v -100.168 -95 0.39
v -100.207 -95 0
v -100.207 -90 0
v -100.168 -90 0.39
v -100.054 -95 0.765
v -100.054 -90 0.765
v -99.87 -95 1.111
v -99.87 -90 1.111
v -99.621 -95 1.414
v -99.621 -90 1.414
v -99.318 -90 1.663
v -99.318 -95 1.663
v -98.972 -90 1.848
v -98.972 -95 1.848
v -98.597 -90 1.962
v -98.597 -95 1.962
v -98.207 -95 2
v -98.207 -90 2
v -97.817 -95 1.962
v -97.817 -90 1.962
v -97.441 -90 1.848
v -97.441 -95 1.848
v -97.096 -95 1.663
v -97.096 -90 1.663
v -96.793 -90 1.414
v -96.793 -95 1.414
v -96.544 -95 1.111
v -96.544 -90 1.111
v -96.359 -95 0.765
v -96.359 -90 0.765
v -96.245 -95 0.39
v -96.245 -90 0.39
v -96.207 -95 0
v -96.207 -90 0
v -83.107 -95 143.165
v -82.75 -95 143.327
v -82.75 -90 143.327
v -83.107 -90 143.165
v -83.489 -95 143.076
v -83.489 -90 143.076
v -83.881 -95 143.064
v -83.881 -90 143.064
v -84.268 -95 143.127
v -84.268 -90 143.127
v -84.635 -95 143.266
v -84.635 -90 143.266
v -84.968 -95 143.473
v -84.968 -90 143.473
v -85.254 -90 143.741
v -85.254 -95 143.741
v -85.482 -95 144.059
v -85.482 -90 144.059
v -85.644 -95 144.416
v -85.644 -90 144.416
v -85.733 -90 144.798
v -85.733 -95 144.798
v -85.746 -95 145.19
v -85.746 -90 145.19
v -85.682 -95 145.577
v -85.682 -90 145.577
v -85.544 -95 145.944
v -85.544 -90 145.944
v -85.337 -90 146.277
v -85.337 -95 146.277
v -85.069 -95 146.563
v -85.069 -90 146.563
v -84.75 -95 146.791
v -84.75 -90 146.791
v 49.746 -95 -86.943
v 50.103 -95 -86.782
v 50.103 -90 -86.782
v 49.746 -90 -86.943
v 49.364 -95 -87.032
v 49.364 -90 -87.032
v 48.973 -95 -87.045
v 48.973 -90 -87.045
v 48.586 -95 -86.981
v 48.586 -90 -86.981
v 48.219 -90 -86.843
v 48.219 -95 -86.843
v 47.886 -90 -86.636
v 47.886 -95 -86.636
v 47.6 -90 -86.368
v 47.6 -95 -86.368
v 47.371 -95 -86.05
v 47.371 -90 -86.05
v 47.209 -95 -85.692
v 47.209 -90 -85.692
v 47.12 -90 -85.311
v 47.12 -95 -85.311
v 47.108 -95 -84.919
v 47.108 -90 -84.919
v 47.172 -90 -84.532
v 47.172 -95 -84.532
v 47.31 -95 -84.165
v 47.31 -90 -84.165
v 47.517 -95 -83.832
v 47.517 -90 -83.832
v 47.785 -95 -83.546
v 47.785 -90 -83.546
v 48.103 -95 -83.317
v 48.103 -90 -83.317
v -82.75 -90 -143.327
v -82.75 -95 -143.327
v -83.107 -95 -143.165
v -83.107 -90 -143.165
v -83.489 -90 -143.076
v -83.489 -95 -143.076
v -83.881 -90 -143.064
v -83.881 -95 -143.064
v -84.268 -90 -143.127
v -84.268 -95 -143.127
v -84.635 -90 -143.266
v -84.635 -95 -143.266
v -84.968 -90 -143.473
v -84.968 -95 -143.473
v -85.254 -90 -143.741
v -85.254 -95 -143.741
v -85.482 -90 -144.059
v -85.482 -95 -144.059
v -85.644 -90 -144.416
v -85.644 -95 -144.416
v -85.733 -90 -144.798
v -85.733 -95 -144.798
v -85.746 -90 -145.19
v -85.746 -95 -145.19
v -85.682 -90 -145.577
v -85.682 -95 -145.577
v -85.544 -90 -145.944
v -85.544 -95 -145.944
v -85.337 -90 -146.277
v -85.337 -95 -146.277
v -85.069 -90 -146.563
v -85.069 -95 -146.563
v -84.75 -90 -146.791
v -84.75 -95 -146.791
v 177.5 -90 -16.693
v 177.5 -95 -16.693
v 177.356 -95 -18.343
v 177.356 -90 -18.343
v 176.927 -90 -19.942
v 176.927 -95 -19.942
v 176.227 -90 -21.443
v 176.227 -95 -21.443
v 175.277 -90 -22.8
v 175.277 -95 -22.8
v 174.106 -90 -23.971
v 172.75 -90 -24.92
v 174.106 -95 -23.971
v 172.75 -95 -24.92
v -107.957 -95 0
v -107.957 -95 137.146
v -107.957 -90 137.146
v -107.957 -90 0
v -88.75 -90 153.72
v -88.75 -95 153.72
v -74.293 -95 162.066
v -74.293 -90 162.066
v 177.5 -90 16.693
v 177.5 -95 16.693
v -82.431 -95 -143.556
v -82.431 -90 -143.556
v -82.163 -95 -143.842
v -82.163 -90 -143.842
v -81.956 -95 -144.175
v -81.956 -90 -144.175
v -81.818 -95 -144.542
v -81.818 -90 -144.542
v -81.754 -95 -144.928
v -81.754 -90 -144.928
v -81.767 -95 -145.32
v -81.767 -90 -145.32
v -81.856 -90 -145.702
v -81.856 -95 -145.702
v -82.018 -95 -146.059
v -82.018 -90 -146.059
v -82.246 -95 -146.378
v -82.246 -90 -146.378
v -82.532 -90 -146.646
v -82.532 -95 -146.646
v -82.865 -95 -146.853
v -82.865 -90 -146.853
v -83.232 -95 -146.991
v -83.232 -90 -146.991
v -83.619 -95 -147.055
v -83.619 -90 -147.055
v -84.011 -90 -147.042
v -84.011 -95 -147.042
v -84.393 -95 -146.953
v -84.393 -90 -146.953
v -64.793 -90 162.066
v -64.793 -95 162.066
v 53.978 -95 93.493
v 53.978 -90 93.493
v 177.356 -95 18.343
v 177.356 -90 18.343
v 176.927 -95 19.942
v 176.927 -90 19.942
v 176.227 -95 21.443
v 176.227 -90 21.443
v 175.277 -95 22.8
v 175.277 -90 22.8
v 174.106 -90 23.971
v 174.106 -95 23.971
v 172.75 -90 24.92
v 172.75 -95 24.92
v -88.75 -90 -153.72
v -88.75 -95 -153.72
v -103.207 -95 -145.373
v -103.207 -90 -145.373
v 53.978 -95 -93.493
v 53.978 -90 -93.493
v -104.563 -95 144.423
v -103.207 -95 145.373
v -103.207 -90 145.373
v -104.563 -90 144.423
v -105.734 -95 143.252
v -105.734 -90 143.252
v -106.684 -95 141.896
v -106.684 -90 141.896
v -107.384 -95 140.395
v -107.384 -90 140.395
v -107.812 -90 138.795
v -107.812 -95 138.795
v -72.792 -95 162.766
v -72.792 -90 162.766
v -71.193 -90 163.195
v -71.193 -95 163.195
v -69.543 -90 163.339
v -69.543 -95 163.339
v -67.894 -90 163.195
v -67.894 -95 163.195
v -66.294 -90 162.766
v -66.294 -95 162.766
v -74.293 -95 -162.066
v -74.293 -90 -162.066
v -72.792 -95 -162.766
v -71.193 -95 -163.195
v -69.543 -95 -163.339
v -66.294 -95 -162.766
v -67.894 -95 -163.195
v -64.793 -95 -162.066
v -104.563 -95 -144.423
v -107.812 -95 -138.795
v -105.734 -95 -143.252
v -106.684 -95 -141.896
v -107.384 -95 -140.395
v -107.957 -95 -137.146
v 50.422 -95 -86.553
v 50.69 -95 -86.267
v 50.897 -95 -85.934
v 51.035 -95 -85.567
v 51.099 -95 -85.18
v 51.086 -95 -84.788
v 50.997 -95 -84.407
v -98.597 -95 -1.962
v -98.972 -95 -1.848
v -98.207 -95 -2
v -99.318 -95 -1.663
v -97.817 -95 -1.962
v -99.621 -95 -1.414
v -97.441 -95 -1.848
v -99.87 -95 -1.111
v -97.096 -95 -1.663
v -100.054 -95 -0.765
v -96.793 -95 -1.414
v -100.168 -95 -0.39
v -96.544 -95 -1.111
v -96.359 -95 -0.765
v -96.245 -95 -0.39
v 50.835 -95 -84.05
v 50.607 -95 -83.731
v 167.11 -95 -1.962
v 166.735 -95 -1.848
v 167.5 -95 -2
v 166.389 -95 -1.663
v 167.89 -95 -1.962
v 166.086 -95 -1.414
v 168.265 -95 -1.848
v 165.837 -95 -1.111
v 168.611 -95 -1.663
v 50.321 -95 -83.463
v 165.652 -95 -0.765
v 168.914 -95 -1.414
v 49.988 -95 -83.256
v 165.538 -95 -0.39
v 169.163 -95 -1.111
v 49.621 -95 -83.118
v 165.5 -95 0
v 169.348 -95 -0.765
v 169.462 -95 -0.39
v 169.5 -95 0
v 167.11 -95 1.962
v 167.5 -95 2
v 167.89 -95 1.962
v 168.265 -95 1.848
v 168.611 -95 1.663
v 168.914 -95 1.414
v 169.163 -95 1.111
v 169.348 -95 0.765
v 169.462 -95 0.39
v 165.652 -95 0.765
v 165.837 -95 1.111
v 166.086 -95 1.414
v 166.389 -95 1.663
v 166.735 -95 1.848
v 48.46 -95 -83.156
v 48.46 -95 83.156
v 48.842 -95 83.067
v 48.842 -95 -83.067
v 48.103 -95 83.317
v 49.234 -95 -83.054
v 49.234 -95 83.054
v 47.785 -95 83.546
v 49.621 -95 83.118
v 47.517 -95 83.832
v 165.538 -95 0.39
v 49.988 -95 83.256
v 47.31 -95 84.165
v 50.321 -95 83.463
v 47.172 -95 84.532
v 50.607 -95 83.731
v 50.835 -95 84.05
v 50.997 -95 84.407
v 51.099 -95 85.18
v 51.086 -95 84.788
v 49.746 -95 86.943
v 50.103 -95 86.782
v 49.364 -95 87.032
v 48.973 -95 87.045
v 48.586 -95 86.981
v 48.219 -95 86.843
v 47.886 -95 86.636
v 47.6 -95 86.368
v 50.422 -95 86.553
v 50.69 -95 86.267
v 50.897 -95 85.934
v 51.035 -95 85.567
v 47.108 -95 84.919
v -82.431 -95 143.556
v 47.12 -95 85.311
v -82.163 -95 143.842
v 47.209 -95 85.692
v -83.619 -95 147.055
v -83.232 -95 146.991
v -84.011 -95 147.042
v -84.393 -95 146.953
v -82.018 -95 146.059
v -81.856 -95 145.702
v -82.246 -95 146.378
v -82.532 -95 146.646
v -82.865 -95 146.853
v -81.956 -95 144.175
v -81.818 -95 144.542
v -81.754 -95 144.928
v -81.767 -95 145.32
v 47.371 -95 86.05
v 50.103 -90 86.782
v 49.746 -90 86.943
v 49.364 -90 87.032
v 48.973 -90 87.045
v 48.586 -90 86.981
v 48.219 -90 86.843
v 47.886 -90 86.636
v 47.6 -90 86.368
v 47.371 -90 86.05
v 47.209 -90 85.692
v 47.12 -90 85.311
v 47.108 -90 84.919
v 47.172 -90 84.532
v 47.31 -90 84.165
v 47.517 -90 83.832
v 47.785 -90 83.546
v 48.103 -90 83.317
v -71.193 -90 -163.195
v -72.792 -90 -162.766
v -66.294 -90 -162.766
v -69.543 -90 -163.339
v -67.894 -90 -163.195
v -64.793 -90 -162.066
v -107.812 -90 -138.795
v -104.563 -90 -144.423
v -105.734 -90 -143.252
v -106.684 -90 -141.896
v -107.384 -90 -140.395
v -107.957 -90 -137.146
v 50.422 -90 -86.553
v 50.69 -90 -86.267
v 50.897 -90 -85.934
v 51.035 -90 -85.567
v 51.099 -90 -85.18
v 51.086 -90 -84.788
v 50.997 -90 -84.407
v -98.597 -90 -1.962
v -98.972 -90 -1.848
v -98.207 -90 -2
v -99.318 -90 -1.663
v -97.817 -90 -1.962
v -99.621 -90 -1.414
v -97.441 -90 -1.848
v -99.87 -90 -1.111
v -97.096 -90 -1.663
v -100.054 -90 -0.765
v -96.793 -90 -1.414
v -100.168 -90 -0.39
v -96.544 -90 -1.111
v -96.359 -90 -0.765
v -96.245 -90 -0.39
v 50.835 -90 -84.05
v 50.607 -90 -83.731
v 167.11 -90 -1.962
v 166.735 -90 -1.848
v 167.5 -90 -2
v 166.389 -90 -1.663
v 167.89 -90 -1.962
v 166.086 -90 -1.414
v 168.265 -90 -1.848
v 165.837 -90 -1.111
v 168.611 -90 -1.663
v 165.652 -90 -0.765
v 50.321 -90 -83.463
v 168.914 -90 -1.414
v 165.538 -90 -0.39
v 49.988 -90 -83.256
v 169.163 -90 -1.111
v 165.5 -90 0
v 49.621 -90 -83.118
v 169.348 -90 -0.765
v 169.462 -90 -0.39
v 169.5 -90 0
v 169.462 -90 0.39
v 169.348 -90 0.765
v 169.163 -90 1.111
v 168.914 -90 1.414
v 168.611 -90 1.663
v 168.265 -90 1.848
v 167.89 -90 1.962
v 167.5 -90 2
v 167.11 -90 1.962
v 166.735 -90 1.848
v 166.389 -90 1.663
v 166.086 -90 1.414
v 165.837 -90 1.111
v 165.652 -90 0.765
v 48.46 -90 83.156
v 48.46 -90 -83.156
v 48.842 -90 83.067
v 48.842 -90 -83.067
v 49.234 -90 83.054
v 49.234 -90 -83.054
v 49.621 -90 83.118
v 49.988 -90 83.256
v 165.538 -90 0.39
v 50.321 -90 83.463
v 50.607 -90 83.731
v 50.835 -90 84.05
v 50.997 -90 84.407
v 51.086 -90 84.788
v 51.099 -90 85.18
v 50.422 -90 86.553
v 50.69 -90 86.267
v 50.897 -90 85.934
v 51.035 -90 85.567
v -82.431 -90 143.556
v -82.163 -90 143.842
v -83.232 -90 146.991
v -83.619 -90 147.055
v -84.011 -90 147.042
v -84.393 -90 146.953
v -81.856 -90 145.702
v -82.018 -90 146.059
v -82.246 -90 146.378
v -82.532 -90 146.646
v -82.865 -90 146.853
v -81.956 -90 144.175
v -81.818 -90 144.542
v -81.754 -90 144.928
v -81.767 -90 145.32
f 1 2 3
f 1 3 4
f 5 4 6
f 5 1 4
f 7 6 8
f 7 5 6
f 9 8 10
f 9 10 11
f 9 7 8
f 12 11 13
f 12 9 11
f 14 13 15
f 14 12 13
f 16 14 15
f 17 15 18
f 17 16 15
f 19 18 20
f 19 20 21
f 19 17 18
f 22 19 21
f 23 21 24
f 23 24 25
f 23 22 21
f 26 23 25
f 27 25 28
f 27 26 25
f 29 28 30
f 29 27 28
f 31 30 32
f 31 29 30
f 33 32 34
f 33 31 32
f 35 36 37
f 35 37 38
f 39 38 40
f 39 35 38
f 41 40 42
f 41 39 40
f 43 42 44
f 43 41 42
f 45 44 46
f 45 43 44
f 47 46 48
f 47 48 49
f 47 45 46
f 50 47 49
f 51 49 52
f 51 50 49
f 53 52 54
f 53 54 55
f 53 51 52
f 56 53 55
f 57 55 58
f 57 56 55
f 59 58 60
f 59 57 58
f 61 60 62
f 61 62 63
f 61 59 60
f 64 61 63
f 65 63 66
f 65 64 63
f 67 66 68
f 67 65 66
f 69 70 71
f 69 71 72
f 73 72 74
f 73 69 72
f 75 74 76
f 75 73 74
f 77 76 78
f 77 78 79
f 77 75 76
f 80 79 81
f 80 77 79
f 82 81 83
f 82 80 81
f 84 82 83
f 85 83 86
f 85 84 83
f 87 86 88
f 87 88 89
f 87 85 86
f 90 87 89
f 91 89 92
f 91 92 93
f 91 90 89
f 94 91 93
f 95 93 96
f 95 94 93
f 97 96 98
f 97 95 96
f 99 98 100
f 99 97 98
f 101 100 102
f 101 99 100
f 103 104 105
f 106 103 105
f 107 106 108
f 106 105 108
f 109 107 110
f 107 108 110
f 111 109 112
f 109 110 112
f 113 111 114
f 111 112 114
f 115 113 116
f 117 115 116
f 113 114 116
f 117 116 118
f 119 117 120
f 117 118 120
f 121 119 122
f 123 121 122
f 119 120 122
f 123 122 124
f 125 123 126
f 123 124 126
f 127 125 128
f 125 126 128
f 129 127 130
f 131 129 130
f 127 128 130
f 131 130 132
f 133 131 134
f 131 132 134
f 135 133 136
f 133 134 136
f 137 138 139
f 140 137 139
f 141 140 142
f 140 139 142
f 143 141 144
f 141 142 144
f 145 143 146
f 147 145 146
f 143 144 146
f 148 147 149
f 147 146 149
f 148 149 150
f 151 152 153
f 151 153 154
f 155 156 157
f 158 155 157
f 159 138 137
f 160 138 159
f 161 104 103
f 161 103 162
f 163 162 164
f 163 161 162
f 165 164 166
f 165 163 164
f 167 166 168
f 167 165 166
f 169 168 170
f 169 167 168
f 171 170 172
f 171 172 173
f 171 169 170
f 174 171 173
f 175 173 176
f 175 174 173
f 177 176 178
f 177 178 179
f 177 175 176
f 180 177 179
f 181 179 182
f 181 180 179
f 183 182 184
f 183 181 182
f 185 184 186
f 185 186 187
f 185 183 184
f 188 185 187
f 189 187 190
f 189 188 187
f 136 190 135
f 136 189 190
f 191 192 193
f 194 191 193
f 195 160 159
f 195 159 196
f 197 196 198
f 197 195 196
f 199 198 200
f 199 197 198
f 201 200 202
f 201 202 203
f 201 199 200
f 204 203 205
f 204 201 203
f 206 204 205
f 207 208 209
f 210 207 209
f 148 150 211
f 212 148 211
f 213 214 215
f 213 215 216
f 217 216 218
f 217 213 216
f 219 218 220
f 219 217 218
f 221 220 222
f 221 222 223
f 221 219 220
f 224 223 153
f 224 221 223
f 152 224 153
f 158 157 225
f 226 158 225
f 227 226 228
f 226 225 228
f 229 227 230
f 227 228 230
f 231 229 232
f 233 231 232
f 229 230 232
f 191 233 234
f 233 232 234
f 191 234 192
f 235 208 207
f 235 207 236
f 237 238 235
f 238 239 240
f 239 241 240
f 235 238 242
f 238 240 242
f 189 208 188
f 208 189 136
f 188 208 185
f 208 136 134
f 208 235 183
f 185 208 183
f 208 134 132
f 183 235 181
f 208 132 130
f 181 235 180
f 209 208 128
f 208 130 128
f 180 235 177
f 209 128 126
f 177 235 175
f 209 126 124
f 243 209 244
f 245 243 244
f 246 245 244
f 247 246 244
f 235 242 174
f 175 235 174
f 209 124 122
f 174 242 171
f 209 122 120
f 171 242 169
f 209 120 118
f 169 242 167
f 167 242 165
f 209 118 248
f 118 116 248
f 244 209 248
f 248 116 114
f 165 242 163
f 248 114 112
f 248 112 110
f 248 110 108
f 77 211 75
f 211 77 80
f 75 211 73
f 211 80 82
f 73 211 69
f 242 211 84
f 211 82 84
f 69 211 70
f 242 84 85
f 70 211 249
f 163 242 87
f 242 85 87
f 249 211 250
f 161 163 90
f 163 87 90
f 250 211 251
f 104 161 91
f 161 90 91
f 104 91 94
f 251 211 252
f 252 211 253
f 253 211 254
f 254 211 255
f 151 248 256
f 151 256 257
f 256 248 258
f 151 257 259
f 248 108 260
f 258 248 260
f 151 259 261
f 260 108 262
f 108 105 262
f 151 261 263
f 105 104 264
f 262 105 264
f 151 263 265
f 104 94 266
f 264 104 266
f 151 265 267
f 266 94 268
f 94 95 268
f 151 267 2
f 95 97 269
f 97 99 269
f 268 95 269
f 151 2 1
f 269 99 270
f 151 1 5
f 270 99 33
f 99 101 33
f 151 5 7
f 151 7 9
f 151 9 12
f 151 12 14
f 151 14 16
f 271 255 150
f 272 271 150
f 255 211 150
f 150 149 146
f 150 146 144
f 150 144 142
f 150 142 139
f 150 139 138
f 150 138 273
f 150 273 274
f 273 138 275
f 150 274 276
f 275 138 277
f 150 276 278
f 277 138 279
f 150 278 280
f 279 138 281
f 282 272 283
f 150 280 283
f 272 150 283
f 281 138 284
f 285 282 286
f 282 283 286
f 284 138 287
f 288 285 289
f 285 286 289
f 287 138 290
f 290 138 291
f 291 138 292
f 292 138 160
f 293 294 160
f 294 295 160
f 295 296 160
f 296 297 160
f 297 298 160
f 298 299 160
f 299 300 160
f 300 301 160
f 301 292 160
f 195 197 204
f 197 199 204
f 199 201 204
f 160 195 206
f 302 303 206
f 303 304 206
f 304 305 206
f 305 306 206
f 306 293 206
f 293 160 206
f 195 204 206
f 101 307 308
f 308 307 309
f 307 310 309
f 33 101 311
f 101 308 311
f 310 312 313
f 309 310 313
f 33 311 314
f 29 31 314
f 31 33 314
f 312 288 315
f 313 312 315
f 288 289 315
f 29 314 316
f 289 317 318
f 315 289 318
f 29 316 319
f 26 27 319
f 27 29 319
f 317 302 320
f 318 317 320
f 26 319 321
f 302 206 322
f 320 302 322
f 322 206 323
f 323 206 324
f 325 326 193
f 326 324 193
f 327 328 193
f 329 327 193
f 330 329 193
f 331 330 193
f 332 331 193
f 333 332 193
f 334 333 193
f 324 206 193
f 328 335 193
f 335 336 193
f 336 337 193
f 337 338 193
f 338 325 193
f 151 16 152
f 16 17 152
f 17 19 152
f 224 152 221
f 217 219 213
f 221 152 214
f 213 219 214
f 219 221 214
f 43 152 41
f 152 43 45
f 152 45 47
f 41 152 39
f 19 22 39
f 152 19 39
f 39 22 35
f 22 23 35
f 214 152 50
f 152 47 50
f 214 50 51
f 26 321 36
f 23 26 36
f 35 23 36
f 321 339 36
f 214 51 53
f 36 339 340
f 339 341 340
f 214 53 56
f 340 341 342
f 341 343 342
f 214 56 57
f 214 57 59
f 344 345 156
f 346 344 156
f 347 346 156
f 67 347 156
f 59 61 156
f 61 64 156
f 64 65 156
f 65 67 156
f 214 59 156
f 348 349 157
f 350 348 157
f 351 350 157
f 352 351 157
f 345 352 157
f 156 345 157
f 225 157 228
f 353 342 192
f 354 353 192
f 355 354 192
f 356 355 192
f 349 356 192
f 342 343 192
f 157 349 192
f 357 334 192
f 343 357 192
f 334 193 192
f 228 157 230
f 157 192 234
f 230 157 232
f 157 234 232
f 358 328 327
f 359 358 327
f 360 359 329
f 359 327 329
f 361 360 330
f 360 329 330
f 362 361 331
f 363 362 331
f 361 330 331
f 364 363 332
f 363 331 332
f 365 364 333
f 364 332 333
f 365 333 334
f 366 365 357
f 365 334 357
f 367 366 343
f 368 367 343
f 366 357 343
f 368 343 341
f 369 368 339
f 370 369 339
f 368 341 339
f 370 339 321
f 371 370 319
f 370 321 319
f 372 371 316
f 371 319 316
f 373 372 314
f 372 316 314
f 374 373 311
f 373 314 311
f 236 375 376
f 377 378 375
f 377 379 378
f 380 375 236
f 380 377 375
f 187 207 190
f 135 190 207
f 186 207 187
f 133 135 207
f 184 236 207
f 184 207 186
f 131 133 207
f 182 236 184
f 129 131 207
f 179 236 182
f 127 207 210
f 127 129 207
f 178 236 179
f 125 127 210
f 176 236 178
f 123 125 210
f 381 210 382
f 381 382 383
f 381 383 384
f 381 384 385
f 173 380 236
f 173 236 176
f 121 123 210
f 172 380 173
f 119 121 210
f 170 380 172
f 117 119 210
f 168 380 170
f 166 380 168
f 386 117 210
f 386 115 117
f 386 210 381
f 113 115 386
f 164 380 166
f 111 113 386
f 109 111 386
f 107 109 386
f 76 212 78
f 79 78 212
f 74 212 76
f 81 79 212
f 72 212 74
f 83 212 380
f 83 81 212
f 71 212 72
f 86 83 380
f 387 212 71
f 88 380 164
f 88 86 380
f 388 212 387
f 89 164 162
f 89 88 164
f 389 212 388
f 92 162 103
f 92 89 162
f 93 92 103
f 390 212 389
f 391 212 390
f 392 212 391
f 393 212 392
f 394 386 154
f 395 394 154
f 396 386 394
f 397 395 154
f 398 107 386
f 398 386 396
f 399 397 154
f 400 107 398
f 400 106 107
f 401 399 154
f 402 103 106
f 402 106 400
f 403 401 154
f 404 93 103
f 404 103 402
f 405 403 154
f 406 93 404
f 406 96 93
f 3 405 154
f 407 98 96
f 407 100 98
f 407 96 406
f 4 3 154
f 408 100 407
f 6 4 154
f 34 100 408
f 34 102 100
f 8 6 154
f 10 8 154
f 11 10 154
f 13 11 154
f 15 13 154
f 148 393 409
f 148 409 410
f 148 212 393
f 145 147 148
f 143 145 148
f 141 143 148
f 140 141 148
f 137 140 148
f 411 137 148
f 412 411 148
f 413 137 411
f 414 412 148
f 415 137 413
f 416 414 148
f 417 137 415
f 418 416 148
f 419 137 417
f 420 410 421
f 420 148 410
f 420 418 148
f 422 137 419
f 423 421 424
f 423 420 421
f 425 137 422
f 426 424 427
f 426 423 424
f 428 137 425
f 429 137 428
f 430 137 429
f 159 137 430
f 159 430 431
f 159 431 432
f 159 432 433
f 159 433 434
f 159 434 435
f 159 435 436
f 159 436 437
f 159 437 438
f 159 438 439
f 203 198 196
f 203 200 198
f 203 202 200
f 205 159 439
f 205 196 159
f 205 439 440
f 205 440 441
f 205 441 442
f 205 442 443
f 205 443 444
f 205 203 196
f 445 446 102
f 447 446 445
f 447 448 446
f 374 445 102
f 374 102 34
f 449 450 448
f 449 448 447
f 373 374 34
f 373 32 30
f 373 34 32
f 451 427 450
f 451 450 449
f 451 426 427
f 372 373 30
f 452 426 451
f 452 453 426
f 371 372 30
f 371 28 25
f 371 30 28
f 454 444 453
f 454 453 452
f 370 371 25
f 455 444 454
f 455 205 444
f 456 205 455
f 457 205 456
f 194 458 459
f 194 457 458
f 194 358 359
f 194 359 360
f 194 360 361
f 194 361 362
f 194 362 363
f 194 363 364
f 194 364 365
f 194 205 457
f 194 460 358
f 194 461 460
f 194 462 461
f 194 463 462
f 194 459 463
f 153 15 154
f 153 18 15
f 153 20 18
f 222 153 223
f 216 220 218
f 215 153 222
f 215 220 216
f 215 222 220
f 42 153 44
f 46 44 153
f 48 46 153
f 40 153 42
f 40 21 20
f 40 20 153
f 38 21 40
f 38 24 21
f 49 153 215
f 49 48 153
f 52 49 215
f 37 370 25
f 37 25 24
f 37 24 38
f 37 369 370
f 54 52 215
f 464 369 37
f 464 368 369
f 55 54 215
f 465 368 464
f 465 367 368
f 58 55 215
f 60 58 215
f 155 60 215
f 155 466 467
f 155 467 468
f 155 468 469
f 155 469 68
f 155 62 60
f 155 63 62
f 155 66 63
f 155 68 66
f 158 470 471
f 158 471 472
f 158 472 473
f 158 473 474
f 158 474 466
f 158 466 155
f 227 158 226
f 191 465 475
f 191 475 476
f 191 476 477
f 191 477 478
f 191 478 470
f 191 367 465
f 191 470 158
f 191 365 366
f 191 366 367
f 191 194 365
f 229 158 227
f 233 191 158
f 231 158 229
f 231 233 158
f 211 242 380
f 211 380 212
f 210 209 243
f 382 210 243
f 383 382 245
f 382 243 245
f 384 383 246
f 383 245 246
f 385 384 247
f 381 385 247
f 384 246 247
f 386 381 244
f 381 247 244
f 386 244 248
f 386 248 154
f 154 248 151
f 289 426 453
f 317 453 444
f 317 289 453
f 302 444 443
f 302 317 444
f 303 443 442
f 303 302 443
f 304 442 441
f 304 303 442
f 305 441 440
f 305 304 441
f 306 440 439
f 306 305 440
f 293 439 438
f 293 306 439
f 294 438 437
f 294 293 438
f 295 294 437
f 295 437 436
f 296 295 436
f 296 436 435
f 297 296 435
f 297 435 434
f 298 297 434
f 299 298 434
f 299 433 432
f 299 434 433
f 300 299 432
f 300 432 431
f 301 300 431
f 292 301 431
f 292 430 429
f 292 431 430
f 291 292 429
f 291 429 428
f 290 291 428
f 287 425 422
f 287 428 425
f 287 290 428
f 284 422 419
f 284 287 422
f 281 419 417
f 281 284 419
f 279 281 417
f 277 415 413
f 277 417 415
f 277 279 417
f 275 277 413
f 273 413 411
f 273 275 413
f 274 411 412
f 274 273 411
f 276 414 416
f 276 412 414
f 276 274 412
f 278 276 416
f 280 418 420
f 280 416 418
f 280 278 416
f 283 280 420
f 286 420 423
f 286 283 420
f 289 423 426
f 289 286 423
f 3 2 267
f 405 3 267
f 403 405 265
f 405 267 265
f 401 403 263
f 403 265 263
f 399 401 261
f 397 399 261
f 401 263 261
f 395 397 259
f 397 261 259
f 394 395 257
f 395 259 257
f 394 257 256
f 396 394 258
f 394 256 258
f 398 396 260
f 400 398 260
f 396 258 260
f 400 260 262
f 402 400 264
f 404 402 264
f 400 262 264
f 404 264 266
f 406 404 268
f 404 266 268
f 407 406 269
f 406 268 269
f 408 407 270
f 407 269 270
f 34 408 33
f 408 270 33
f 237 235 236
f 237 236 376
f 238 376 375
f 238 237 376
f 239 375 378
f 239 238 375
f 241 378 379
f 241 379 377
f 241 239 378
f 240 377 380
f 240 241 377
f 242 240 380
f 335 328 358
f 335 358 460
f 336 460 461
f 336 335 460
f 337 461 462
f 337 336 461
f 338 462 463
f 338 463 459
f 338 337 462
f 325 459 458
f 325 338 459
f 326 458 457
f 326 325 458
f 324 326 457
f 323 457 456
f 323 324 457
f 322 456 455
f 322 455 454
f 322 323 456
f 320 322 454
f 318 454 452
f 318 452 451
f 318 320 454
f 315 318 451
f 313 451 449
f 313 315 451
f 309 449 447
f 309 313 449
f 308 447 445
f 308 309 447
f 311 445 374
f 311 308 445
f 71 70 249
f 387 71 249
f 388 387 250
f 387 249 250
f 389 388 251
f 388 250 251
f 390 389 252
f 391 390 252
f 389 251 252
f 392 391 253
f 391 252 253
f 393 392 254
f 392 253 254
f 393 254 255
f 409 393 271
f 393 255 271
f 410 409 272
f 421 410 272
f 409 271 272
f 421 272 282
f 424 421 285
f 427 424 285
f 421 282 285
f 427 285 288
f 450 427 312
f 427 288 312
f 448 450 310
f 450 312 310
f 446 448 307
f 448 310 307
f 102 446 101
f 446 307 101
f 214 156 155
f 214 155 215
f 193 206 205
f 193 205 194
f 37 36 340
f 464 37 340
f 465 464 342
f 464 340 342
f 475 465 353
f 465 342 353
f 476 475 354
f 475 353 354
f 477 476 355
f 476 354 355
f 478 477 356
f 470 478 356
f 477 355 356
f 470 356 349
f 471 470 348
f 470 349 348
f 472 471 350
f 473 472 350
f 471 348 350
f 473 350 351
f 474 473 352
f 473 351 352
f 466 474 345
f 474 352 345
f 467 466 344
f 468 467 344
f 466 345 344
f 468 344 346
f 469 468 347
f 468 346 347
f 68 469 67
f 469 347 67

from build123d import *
from build123d.topology import SkipClean

# Parameters (mm, degrees)
STOCK_FRAME_START          = -95
STOCK_FRAME_MASTER_1_DEPTH = 5


# Read off the part's stored shape, not the designer's step: Stock-Frame master-1
with BuildPart() as part:
    # Stock-Frame master-1 outline → Stock-Frame master-1 (new body)
    with BuildSketch(Plane(origin=(0, 0, 0), x_dir=(1, 0, 0), z_dir=(0, 1, 0)).offset(STOCK_FRAME_START)):
        with BuildLine():
            Line((48.103357378, 83.317458993), (0, 0))
            Line((0, 0), (165.5, 0))
            ThreePointArc((165.5, 0), (167.5, 2), (169.5, 0))
            Line((169.5, 0), (177.5, 0))
            Line((177.5, 0), (177.5, 16.693176311))
            ThreePointArc((177.5, 16.693176311), (176.227241336, 21.443176311), (172.75, 24.920417647))
            Line((172.75, 24.920417647), (53.978357378, 93.493257487))
            Line((53.978357378, 93.493257487), (50.103357378, 86.781560608))
            ThreePointArc((50.103357378, 86.781560608), (50.835408185, 84.049509801), (48.103357378, 83.317458993))
        make_face()
    extrude(amount=STOCK_FRAME_MASTER_1_DEPTH)

    # Mirror1: part across plane


with BuildPart() as part_1:
    with SkipClean():  # the faces are left unmerged after this step: merging them gives an invalid solid
        add(part.part)
        add(part.part.mirror(Plane(origin=(220, -90, 0), x_dir=(1, 0, 0), z_dir=(0, 0, -1))))


with BuildPart() as body_2:
    # Mirror2: mirrored copy
    add(part_1.part.mirror(Plane(origin=(0, -90, 0), x_dir=(-0.49999999999999406, 0, 0.866025403784442), z_dir=(0.8660254037844419, 0, 0.4999999999999941))))


with BuildPart() as part_2:
    with SkipClean():  # the faces are left unmerged after this step: merging them gives an invalid solid
        add(part_1.part)

        # Mirror3: part across plane
        add(part_1.part.mirror(Plane(origin=(0, -90, 0), x_dir=(0.49999999999999406, 0, 0.866025403784442), z_dir=(0.8660254037844419, 0, -0.4999999999999941))))


with BuildPart() as body_2_1:
    add(body_2.part)

    # Combine1: union part
    add(part_2.part)


solid = body_2_1.part
